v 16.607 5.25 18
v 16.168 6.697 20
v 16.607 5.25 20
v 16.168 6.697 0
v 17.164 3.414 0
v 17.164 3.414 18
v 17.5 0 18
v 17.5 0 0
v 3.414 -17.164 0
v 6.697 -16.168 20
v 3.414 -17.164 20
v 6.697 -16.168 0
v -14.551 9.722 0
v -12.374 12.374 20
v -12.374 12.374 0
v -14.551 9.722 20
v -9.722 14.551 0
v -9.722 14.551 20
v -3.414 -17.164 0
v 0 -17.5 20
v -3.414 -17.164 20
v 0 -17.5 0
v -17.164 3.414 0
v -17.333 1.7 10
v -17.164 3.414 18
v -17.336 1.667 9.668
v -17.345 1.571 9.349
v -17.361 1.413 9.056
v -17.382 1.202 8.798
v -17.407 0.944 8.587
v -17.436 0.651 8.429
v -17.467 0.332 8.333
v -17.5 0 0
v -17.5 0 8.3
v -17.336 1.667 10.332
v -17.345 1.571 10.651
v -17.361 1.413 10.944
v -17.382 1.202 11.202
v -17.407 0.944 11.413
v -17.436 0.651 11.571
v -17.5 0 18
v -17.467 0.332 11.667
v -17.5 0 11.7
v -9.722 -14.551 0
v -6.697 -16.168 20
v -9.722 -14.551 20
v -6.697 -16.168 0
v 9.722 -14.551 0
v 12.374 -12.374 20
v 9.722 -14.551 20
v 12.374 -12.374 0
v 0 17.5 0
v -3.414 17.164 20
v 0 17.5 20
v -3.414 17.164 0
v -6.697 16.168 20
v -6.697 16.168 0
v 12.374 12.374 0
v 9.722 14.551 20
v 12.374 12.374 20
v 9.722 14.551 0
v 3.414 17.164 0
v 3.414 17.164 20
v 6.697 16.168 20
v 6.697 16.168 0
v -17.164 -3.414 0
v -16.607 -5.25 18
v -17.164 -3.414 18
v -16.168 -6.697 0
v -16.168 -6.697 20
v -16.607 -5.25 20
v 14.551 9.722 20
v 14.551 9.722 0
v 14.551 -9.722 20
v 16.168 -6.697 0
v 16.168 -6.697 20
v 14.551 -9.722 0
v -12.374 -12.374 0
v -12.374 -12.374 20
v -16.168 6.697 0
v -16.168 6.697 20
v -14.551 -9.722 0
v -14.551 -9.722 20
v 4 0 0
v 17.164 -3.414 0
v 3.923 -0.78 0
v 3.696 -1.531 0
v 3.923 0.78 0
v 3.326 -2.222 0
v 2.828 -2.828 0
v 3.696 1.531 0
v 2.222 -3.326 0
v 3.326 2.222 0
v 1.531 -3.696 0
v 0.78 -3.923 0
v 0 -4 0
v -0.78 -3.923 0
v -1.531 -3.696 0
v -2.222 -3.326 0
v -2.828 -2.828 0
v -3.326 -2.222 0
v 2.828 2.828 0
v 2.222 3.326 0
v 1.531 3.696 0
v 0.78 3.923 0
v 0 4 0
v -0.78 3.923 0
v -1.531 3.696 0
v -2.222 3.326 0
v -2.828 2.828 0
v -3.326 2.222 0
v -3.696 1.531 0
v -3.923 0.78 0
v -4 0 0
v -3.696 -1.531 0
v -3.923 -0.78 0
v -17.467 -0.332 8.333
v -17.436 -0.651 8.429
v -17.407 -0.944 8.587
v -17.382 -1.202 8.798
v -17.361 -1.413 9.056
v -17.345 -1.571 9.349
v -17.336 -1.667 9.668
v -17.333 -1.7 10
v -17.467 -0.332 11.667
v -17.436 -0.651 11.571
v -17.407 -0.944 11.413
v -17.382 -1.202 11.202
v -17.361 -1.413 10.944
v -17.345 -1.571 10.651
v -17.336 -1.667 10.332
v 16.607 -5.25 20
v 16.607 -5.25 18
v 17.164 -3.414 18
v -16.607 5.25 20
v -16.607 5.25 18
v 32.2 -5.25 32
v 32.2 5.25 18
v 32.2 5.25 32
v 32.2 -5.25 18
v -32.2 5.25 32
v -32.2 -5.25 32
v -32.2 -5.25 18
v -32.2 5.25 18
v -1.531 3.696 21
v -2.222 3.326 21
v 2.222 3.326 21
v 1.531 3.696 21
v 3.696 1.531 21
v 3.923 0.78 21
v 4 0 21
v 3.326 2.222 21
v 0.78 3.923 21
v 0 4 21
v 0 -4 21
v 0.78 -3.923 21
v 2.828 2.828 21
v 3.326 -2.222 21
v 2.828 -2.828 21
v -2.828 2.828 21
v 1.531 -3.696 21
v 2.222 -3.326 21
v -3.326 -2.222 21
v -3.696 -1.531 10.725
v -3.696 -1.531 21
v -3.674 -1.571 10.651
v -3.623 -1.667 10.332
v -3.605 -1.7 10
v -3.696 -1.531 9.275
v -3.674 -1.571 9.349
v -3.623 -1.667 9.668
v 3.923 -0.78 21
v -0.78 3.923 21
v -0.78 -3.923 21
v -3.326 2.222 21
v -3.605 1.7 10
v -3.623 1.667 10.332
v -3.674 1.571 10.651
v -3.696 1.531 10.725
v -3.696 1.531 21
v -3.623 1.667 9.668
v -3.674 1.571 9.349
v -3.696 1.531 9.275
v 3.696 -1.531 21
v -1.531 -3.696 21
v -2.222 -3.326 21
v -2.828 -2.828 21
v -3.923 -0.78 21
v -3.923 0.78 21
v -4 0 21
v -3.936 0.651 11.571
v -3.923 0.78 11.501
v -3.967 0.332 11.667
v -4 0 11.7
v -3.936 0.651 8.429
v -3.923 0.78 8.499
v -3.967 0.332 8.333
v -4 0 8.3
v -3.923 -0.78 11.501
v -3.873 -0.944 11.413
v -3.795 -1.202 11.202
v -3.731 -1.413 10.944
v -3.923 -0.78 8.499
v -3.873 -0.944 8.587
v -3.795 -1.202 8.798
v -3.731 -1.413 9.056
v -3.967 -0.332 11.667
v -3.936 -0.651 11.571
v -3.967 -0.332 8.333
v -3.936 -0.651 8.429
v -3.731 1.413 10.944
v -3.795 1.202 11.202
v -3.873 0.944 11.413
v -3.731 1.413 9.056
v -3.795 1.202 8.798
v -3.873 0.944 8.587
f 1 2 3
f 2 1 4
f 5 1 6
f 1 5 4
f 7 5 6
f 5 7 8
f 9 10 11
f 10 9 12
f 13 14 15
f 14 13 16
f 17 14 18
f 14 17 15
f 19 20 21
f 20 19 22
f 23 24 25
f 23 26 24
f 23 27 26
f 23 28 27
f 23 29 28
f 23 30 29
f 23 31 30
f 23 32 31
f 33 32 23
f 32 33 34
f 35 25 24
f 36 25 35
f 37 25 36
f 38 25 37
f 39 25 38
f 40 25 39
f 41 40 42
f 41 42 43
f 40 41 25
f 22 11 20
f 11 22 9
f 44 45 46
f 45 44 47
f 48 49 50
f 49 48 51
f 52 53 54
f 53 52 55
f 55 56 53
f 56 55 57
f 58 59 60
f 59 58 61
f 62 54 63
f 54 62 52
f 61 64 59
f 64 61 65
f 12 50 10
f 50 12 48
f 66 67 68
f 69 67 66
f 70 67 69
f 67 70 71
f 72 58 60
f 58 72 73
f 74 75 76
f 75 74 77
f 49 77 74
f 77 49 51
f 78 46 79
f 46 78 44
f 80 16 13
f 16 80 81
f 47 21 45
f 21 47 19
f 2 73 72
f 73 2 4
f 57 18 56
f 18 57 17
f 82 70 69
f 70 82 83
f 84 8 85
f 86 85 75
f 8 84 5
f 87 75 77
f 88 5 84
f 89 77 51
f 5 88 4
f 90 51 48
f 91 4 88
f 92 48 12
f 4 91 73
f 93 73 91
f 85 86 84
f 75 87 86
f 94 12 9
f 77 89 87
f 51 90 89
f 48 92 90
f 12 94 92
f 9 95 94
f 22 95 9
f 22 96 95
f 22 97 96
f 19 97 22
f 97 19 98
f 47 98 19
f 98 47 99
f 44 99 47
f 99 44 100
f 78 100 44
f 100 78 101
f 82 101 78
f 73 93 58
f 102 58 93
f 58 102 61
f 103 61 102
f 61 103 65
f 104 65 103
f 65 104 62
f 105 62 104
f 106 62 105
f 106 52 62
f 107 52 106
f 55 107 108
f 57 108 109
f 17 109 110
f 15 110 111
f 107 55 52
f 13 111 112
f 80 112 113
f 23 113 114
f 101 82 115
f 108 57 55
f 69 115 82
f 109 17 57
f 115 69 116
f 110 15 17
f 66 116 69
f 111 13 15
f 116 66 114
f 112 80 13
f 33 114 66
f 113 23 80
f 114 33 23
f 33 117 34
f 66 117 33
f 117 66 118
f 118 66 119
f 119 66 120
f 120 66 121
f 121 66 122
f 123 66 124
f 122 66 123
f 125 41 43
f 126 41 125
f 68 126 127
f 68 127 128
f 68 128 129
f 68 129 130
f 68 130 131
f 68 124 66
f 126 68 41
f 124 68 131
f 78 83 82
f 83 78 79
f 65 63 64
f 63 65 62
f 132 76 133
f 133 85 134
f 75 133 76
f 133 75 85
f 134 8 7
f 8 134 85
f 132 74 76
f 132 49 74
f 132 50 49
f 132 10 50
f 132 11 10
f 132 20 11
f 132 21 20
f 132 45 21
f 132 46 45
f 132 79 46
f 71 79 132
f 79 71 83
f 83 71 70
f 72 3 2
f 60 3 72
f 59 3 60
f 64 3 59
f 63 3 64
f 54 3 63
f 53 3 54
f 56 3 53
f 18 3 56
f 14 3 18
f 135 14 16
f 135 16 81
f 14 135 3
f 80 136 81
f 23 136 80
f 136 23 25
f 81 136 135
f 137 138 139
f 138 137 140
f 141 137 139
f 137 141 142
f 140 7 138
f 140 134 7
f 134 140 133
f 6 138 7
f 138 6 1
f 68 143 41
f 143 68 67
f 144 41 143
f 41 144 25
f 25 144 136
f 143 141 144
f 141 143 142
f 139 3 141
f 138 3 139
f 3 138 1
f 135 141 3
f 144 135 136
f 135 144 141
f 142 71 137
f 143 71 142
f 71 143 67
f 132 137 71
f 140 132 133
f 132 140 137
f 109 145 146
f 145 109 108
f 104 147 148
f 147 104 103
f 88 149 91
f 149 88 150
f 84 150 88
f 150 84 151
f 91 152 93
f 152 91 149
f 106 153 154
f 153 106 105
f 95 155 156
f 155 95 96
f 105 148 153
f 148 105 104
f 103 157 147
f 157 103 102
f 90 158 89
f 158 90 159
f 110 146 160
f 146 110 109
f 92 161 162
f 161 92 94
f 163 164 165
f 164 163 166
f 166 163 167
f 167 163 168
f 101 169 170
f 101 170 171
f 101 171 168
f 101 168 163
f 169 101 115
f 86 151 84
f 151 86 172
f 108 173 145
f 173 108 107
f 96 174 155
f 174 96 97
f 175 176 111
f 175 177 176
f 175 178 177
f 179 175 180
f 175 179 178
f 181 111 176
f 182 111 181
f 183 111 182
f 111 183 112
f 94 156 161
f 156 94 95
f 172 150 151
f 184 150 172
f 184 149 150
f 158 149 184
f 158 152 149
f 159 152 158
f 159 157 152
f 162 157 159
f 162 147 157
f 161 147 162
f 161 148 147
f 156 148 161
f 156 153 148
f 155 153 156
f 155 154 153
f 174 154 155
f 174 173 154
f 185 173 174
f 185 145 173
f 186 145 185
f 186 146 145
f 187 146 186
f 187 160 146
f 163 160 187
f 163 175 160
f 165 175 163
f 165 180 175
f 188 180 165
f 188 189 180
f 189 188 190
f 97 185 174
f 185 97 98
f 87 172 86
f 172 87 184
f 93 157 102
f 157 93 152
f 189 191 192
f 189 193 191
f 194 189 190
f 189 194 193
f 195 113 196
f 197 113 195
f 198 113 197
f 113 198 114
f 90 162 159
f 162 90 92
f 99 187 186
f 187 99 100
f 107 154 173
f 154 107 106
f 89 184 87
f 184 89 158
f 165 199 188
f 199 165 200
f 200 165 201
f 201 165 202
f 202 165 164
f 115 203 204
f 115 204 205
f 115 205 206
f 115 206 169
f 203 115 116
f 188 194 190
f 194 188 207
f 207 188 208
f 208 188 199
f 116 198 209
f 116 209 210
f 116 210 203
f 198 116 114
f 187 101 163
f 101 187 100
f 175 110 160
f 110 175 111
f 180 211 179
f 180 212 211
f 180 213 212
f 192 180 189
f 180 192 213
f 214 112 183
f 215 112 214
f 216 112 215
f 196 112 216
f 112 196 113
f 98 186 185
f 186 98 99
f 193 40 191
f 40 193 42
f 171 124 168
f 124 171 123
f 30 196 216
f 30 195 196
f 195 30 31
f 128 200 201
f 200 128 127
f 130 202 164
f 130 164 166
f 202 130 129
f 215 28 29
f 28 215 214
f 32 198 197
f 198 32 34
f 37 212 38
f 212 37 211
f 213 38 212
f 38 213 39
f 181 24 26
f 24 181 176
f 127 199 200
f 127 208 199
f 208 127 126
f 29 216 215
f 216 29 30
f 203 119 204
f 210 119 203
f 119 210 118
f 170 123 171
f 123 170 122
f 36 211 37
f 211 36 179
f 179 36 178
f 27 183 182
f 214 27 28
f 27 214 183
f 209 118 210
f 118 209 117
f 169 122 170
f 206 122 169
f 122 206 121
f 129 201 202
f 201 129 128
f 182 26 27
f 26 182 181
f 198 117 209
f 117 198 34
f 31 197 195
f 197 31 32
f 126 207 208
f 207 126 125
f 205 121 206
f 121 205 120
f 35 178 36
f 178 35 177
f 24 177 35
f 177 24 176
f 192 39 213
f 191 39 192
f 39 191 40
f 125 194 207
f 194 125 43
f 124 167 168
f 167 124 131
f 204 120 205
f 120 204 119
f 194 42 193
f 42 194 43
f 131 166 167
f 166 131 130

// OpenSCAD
$fn = 32;

// ----------------------------------------------------------------------
// Hand knob: 35 x 64.4 x 20 mm
// ----------------------------------------------------------------------

// --- parameters (mm) ---
head_d = 35;              // knob diameter
head_h = 20;              // knob height
hole_d = 8;               // shaft bore
set_d = 3.4;              // set screw tap hole
wing_l = 64.4;            // wing span
wing_w = 10.5;            // wing width
wing_h = 12;              // wing thickness

module body() {
  cylinder(h = head_h, d = head_d);
}

module wing() {
  /* wing sunk 2 mm into the knob so the joint overlaps */
  translate([-wing_l / 2, -wing_w / 2, head_h - 2])
    cube([wing_l, wing_w, wing_h + 2]);
}

difference() {
  union() {
    body();
    wing();
  }
  translate([0, 0, -1]) cylinder(h = head_h + 0 + 2, d = hole_d);
  translate([-head_d / 2 - 1, 0, head_h * 0.5]) rotate([0, 90, 0]) cylinder(h = head_d / 2 + 2, d = set_d);
}
